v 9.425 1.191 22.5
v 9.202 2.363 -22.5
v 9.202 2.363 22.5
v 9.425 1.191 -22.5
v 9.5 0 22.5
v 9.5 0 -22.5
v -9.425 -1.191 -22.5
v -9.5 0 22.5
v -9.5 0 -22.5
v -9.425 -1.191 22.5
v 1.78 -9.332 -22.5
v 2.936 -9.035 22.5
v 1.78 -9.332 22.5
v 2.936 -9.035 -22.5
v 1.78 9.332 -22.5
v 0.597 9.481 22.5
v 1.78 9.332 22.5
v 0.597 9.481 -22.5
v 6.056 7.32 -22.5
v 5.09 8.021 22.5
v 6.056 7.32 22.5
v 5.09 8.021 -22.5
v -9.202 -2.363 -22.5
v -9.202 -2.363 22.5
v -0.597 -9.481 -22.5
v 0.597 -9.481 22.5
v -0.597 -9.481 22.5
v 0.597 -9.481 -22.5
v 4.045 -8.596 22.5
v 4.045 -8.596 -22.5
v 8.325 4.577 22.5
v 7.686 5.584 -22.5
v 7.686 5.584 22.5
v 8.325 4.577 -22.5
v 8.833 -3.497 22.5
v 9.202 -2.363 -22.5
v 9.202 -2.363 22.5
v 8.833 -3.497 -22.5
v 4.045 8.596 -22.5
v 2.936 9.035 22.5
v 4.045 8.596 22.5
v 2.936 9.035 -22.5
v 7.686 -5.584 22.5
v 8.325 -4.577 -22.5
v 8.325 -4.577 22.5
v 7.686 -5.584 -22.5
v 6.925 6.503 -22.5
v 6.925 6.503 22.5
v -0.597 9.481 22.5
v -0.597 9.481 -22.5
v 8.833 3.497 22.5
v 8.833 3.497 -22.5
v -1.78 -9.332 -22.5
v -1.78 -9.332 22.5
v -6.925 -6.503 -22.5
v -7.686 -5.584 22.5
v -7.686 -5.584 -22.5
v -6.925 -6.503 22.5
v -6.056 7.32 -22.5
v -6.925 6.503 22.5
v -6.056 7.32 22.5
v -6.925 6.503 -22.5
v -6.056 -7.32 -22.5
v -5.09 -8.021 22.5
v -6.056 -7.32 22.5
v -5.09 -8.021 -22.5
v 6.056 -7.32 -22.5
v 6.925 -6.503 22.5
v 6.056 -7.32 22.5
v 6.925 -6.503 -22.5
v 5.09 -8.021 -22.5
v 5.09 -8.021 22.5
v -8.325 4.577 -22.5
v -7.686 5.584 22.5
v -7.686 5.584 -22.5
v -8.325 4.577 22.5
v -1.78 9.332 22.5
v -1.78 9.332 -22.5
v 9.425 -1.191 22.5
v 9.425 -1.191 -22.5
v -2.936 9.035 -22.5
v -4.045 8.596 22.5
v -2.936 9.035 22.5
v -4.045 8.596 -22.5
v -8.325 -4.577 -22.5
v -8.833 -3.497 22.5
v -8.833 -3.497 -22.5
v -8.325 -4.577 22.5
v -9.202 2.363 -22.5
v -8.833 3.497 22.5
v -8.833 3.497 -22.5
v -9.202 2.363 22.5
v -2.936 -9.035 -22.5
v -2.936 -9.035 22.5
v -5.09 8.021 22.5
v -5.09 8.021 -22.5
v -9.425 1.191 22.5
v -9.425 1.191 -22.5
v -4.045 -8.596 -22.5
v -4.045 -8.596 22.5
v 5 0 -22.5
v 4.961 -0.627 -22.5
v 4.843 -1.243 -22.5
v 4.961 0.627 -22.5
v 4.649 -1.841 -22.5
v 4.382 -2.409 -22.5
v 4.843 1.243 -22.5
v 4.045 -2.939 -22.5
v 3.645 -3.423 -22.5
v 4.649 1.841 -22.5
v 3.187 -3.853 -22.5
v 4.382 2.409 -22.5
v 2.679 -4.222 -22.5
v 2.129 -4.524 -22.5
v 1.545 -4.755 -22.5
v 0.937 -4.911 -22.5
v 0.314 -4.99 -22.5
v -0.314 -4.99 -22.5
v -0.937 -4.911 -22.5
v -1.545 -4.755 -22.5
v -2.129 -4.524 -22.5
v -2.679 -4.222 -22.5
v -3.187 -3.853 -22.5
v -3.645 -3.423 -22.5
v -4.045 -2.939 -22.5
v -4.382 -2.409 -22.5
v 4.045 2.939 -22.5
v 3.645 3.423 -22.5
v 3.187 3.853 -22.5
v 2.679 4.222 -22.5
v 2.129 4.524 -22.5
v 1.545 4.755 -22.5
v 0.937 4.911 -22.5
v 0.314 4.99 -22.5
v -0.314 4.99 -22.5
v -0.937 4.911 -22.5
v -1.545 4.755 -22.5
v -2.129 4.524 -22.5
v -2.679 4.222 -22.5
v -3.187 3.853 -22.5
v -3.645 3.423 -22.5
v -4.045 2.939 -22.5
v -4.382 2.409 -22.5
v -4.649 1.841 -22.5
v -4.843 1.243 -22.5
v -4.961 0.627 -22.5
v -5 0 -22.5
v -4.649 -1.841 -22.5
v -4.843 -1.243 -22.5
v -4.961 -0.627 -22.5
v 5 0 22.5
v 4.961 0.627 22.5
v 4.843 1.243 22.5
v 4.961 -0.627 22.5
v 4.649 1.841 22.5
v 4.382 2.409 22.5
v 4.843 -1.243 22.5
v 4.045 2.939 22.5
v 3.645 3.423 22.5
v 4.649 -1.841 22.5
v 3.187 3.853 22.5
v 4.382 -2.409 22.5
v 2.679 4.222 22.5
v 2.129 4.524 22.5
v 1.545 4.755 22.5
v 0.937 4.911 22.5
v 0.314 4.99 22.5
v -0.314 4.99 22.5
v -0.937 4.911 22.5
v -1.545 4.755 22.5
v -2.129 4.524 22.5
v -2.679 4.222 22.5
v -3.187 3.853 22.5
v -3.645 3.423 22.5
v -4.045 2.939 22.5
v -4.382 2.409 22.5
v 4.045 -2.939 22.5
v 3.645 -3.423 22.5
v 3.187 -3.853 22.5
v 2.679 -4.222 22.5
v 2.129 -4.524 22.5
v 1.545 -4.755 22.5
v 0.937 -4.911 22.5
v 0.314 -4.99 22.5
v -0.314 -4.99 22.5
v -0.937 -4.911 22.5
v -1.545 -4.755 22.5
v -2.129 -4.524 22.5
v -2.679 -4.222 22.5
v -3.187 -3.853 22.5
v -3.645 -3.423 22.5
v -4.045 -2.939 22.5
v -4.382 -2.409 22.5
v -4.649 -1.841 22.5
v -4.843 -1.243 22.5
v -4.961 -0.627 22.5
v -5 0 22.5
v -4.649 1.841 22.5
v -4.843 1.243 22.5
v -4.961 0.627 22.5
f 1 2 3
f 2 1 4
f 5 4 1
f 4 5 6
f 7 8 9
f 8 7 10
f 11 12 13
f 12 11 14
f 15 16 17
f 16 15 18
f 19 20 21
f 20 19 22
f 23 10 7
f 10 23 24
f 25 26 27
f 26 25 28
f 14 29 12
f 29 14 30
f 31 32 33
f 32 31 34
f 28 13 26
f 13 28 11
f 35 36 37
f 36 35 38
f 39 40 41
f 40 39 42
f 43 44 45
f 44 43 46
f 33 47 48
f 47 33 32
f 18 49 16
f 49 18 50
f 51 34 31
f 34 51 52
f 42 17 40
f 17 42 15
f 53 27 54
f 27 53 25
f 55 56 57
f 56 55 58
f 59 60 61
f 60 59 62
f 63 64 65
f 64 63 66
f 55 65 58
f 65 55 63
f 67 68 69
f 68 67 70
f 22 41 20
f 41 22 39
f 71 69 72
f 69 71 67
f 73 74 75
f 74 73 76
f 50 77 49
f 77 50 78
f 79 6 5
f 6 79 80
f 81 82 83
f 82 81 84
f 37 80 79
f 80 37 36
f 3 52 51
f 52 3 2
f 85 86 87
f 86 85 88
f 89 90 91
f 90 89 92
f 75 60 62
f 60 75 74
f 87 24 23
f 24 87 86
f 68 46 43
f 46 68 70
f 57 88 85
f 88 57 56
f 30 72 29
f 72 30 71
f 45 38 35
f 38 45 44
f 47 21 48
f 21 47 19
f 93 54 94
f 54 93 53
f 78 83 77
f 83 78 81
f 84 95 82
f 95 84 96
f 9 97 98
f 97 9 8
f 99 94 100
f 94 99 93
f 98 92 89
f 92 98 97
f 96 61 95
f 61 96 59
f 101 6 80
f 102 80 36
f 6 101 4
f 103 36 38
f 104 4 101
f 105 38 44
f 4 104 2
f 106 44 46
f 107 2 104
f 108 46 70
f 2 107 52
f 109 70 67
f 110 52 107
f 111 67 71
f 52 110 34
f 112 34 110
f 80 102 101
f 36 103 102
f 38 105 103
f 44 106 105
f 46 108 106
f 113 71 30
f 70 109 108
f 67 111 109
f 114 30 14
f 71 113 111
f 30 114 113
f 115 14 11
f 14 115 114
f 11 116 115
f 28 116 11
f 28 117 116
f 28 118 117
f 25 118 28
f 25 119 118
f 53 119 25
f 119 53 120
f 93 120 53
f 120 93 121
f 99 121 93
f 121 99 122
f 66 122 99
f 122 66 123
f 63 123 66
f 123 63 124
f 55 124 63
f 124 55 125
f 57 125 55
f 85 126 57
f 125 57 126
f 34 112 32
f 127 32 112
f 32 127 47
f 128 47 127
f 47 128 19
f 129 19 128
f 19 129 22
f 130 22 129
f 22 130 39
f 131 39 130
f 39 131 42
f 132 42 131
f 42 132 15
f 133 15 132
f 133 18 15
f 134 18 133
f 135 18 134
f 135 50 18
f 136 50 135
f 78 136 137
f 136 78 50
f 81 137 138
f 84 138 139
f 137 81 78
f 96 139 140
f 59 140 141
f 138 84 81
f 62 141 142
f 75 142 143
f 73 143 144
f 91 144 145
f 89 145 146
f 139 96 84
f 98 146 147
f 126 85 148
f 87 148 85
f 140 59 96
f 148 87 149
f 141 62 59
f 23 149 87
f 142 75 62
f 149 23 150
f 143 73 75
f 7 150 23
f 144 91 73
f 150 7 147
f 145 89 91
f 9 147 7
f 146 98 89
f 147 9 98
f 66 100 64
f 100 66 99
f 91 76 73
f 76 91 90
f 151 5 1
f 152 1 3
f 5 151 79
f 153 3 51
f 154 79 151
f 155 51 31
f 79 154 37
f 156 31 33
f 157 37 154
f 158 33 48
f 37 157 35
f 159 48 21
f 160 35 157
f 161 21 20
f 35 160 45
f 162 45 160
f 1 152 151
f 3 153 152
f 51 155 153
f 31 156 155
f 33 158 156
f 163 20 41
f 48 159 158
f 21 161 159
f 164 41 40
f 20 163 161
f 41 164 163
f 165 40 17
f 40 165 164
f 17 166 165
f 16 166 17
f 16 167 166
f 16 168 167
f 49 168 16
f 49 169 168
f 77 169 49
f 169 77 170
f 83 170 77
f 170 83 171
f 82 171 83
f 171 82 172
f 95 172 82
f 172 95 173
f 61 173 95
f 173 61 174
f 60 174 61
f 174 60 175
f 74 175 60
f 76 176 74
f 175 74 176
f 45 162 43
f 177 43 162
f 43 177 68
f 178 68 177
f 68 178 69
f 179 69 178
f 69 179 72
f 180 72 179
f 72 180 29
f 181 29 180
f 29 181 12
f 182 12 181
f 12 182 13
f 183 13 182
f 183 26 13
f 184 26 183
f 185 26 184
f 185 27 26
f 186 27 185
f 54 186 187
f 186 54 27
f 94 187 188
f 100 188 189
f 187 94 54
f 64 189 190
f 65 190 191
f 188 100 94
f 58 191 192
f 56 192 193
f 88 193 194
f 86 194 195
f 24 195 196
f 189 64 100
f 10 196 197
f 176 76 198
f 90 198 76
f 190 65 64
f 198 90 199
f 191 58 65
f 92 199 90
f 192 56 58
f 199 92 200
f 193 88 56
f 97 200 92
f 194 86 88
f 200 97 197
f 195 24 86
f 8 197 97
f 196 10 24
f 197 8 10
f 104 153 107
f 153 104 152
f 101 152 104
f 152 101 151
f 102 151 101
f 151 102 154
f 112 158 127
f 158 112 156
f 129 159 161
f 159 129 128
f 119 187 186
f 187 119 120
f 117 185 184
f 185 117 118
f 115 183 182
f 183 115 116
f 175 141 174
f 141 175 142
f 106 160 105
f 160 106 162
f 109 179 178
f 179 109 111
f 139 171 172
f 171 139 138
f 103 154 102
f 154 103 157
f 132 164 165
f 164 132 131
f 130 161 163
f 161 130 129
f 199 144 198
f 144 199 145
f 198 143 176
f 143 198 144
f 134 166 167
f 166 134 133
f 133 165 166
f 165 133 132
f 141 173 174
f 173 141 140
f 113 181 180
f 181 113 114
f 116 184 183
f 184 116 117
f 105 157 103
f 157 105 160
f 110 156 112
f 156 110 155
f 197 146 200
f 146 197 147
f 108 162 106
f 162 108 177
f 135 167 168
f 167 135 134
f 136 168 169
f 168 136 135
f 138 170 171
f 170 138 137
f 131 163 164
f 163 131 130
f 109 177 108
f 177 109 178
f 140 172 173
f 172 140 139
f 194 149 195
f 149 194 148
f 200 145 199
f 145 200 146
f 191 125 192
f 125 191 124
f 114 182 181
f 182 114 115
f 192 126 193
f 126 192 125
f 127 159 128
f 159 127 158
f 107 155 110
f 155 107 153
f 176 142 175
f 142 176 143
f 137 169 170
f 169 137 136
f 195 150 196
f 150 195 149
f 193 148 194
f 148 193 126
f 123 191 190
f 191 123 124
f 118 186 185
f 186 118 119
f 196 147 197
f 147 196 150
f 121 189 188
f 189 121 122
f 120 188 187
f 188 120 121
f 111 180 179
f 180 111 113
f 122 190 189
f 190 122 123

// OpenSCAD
$fn = 50;


difference() {
	union() {
		translate(v = [0, 0, -22.5000000000]) {
			cylinder(h = 45, r = 9.5000000000);
		}
	}
	union() {
		translate(v = [0, 0, -100.0000000000]) {
			cylinder(h = 200, r = 5.0000000000);
		}
	}
}
